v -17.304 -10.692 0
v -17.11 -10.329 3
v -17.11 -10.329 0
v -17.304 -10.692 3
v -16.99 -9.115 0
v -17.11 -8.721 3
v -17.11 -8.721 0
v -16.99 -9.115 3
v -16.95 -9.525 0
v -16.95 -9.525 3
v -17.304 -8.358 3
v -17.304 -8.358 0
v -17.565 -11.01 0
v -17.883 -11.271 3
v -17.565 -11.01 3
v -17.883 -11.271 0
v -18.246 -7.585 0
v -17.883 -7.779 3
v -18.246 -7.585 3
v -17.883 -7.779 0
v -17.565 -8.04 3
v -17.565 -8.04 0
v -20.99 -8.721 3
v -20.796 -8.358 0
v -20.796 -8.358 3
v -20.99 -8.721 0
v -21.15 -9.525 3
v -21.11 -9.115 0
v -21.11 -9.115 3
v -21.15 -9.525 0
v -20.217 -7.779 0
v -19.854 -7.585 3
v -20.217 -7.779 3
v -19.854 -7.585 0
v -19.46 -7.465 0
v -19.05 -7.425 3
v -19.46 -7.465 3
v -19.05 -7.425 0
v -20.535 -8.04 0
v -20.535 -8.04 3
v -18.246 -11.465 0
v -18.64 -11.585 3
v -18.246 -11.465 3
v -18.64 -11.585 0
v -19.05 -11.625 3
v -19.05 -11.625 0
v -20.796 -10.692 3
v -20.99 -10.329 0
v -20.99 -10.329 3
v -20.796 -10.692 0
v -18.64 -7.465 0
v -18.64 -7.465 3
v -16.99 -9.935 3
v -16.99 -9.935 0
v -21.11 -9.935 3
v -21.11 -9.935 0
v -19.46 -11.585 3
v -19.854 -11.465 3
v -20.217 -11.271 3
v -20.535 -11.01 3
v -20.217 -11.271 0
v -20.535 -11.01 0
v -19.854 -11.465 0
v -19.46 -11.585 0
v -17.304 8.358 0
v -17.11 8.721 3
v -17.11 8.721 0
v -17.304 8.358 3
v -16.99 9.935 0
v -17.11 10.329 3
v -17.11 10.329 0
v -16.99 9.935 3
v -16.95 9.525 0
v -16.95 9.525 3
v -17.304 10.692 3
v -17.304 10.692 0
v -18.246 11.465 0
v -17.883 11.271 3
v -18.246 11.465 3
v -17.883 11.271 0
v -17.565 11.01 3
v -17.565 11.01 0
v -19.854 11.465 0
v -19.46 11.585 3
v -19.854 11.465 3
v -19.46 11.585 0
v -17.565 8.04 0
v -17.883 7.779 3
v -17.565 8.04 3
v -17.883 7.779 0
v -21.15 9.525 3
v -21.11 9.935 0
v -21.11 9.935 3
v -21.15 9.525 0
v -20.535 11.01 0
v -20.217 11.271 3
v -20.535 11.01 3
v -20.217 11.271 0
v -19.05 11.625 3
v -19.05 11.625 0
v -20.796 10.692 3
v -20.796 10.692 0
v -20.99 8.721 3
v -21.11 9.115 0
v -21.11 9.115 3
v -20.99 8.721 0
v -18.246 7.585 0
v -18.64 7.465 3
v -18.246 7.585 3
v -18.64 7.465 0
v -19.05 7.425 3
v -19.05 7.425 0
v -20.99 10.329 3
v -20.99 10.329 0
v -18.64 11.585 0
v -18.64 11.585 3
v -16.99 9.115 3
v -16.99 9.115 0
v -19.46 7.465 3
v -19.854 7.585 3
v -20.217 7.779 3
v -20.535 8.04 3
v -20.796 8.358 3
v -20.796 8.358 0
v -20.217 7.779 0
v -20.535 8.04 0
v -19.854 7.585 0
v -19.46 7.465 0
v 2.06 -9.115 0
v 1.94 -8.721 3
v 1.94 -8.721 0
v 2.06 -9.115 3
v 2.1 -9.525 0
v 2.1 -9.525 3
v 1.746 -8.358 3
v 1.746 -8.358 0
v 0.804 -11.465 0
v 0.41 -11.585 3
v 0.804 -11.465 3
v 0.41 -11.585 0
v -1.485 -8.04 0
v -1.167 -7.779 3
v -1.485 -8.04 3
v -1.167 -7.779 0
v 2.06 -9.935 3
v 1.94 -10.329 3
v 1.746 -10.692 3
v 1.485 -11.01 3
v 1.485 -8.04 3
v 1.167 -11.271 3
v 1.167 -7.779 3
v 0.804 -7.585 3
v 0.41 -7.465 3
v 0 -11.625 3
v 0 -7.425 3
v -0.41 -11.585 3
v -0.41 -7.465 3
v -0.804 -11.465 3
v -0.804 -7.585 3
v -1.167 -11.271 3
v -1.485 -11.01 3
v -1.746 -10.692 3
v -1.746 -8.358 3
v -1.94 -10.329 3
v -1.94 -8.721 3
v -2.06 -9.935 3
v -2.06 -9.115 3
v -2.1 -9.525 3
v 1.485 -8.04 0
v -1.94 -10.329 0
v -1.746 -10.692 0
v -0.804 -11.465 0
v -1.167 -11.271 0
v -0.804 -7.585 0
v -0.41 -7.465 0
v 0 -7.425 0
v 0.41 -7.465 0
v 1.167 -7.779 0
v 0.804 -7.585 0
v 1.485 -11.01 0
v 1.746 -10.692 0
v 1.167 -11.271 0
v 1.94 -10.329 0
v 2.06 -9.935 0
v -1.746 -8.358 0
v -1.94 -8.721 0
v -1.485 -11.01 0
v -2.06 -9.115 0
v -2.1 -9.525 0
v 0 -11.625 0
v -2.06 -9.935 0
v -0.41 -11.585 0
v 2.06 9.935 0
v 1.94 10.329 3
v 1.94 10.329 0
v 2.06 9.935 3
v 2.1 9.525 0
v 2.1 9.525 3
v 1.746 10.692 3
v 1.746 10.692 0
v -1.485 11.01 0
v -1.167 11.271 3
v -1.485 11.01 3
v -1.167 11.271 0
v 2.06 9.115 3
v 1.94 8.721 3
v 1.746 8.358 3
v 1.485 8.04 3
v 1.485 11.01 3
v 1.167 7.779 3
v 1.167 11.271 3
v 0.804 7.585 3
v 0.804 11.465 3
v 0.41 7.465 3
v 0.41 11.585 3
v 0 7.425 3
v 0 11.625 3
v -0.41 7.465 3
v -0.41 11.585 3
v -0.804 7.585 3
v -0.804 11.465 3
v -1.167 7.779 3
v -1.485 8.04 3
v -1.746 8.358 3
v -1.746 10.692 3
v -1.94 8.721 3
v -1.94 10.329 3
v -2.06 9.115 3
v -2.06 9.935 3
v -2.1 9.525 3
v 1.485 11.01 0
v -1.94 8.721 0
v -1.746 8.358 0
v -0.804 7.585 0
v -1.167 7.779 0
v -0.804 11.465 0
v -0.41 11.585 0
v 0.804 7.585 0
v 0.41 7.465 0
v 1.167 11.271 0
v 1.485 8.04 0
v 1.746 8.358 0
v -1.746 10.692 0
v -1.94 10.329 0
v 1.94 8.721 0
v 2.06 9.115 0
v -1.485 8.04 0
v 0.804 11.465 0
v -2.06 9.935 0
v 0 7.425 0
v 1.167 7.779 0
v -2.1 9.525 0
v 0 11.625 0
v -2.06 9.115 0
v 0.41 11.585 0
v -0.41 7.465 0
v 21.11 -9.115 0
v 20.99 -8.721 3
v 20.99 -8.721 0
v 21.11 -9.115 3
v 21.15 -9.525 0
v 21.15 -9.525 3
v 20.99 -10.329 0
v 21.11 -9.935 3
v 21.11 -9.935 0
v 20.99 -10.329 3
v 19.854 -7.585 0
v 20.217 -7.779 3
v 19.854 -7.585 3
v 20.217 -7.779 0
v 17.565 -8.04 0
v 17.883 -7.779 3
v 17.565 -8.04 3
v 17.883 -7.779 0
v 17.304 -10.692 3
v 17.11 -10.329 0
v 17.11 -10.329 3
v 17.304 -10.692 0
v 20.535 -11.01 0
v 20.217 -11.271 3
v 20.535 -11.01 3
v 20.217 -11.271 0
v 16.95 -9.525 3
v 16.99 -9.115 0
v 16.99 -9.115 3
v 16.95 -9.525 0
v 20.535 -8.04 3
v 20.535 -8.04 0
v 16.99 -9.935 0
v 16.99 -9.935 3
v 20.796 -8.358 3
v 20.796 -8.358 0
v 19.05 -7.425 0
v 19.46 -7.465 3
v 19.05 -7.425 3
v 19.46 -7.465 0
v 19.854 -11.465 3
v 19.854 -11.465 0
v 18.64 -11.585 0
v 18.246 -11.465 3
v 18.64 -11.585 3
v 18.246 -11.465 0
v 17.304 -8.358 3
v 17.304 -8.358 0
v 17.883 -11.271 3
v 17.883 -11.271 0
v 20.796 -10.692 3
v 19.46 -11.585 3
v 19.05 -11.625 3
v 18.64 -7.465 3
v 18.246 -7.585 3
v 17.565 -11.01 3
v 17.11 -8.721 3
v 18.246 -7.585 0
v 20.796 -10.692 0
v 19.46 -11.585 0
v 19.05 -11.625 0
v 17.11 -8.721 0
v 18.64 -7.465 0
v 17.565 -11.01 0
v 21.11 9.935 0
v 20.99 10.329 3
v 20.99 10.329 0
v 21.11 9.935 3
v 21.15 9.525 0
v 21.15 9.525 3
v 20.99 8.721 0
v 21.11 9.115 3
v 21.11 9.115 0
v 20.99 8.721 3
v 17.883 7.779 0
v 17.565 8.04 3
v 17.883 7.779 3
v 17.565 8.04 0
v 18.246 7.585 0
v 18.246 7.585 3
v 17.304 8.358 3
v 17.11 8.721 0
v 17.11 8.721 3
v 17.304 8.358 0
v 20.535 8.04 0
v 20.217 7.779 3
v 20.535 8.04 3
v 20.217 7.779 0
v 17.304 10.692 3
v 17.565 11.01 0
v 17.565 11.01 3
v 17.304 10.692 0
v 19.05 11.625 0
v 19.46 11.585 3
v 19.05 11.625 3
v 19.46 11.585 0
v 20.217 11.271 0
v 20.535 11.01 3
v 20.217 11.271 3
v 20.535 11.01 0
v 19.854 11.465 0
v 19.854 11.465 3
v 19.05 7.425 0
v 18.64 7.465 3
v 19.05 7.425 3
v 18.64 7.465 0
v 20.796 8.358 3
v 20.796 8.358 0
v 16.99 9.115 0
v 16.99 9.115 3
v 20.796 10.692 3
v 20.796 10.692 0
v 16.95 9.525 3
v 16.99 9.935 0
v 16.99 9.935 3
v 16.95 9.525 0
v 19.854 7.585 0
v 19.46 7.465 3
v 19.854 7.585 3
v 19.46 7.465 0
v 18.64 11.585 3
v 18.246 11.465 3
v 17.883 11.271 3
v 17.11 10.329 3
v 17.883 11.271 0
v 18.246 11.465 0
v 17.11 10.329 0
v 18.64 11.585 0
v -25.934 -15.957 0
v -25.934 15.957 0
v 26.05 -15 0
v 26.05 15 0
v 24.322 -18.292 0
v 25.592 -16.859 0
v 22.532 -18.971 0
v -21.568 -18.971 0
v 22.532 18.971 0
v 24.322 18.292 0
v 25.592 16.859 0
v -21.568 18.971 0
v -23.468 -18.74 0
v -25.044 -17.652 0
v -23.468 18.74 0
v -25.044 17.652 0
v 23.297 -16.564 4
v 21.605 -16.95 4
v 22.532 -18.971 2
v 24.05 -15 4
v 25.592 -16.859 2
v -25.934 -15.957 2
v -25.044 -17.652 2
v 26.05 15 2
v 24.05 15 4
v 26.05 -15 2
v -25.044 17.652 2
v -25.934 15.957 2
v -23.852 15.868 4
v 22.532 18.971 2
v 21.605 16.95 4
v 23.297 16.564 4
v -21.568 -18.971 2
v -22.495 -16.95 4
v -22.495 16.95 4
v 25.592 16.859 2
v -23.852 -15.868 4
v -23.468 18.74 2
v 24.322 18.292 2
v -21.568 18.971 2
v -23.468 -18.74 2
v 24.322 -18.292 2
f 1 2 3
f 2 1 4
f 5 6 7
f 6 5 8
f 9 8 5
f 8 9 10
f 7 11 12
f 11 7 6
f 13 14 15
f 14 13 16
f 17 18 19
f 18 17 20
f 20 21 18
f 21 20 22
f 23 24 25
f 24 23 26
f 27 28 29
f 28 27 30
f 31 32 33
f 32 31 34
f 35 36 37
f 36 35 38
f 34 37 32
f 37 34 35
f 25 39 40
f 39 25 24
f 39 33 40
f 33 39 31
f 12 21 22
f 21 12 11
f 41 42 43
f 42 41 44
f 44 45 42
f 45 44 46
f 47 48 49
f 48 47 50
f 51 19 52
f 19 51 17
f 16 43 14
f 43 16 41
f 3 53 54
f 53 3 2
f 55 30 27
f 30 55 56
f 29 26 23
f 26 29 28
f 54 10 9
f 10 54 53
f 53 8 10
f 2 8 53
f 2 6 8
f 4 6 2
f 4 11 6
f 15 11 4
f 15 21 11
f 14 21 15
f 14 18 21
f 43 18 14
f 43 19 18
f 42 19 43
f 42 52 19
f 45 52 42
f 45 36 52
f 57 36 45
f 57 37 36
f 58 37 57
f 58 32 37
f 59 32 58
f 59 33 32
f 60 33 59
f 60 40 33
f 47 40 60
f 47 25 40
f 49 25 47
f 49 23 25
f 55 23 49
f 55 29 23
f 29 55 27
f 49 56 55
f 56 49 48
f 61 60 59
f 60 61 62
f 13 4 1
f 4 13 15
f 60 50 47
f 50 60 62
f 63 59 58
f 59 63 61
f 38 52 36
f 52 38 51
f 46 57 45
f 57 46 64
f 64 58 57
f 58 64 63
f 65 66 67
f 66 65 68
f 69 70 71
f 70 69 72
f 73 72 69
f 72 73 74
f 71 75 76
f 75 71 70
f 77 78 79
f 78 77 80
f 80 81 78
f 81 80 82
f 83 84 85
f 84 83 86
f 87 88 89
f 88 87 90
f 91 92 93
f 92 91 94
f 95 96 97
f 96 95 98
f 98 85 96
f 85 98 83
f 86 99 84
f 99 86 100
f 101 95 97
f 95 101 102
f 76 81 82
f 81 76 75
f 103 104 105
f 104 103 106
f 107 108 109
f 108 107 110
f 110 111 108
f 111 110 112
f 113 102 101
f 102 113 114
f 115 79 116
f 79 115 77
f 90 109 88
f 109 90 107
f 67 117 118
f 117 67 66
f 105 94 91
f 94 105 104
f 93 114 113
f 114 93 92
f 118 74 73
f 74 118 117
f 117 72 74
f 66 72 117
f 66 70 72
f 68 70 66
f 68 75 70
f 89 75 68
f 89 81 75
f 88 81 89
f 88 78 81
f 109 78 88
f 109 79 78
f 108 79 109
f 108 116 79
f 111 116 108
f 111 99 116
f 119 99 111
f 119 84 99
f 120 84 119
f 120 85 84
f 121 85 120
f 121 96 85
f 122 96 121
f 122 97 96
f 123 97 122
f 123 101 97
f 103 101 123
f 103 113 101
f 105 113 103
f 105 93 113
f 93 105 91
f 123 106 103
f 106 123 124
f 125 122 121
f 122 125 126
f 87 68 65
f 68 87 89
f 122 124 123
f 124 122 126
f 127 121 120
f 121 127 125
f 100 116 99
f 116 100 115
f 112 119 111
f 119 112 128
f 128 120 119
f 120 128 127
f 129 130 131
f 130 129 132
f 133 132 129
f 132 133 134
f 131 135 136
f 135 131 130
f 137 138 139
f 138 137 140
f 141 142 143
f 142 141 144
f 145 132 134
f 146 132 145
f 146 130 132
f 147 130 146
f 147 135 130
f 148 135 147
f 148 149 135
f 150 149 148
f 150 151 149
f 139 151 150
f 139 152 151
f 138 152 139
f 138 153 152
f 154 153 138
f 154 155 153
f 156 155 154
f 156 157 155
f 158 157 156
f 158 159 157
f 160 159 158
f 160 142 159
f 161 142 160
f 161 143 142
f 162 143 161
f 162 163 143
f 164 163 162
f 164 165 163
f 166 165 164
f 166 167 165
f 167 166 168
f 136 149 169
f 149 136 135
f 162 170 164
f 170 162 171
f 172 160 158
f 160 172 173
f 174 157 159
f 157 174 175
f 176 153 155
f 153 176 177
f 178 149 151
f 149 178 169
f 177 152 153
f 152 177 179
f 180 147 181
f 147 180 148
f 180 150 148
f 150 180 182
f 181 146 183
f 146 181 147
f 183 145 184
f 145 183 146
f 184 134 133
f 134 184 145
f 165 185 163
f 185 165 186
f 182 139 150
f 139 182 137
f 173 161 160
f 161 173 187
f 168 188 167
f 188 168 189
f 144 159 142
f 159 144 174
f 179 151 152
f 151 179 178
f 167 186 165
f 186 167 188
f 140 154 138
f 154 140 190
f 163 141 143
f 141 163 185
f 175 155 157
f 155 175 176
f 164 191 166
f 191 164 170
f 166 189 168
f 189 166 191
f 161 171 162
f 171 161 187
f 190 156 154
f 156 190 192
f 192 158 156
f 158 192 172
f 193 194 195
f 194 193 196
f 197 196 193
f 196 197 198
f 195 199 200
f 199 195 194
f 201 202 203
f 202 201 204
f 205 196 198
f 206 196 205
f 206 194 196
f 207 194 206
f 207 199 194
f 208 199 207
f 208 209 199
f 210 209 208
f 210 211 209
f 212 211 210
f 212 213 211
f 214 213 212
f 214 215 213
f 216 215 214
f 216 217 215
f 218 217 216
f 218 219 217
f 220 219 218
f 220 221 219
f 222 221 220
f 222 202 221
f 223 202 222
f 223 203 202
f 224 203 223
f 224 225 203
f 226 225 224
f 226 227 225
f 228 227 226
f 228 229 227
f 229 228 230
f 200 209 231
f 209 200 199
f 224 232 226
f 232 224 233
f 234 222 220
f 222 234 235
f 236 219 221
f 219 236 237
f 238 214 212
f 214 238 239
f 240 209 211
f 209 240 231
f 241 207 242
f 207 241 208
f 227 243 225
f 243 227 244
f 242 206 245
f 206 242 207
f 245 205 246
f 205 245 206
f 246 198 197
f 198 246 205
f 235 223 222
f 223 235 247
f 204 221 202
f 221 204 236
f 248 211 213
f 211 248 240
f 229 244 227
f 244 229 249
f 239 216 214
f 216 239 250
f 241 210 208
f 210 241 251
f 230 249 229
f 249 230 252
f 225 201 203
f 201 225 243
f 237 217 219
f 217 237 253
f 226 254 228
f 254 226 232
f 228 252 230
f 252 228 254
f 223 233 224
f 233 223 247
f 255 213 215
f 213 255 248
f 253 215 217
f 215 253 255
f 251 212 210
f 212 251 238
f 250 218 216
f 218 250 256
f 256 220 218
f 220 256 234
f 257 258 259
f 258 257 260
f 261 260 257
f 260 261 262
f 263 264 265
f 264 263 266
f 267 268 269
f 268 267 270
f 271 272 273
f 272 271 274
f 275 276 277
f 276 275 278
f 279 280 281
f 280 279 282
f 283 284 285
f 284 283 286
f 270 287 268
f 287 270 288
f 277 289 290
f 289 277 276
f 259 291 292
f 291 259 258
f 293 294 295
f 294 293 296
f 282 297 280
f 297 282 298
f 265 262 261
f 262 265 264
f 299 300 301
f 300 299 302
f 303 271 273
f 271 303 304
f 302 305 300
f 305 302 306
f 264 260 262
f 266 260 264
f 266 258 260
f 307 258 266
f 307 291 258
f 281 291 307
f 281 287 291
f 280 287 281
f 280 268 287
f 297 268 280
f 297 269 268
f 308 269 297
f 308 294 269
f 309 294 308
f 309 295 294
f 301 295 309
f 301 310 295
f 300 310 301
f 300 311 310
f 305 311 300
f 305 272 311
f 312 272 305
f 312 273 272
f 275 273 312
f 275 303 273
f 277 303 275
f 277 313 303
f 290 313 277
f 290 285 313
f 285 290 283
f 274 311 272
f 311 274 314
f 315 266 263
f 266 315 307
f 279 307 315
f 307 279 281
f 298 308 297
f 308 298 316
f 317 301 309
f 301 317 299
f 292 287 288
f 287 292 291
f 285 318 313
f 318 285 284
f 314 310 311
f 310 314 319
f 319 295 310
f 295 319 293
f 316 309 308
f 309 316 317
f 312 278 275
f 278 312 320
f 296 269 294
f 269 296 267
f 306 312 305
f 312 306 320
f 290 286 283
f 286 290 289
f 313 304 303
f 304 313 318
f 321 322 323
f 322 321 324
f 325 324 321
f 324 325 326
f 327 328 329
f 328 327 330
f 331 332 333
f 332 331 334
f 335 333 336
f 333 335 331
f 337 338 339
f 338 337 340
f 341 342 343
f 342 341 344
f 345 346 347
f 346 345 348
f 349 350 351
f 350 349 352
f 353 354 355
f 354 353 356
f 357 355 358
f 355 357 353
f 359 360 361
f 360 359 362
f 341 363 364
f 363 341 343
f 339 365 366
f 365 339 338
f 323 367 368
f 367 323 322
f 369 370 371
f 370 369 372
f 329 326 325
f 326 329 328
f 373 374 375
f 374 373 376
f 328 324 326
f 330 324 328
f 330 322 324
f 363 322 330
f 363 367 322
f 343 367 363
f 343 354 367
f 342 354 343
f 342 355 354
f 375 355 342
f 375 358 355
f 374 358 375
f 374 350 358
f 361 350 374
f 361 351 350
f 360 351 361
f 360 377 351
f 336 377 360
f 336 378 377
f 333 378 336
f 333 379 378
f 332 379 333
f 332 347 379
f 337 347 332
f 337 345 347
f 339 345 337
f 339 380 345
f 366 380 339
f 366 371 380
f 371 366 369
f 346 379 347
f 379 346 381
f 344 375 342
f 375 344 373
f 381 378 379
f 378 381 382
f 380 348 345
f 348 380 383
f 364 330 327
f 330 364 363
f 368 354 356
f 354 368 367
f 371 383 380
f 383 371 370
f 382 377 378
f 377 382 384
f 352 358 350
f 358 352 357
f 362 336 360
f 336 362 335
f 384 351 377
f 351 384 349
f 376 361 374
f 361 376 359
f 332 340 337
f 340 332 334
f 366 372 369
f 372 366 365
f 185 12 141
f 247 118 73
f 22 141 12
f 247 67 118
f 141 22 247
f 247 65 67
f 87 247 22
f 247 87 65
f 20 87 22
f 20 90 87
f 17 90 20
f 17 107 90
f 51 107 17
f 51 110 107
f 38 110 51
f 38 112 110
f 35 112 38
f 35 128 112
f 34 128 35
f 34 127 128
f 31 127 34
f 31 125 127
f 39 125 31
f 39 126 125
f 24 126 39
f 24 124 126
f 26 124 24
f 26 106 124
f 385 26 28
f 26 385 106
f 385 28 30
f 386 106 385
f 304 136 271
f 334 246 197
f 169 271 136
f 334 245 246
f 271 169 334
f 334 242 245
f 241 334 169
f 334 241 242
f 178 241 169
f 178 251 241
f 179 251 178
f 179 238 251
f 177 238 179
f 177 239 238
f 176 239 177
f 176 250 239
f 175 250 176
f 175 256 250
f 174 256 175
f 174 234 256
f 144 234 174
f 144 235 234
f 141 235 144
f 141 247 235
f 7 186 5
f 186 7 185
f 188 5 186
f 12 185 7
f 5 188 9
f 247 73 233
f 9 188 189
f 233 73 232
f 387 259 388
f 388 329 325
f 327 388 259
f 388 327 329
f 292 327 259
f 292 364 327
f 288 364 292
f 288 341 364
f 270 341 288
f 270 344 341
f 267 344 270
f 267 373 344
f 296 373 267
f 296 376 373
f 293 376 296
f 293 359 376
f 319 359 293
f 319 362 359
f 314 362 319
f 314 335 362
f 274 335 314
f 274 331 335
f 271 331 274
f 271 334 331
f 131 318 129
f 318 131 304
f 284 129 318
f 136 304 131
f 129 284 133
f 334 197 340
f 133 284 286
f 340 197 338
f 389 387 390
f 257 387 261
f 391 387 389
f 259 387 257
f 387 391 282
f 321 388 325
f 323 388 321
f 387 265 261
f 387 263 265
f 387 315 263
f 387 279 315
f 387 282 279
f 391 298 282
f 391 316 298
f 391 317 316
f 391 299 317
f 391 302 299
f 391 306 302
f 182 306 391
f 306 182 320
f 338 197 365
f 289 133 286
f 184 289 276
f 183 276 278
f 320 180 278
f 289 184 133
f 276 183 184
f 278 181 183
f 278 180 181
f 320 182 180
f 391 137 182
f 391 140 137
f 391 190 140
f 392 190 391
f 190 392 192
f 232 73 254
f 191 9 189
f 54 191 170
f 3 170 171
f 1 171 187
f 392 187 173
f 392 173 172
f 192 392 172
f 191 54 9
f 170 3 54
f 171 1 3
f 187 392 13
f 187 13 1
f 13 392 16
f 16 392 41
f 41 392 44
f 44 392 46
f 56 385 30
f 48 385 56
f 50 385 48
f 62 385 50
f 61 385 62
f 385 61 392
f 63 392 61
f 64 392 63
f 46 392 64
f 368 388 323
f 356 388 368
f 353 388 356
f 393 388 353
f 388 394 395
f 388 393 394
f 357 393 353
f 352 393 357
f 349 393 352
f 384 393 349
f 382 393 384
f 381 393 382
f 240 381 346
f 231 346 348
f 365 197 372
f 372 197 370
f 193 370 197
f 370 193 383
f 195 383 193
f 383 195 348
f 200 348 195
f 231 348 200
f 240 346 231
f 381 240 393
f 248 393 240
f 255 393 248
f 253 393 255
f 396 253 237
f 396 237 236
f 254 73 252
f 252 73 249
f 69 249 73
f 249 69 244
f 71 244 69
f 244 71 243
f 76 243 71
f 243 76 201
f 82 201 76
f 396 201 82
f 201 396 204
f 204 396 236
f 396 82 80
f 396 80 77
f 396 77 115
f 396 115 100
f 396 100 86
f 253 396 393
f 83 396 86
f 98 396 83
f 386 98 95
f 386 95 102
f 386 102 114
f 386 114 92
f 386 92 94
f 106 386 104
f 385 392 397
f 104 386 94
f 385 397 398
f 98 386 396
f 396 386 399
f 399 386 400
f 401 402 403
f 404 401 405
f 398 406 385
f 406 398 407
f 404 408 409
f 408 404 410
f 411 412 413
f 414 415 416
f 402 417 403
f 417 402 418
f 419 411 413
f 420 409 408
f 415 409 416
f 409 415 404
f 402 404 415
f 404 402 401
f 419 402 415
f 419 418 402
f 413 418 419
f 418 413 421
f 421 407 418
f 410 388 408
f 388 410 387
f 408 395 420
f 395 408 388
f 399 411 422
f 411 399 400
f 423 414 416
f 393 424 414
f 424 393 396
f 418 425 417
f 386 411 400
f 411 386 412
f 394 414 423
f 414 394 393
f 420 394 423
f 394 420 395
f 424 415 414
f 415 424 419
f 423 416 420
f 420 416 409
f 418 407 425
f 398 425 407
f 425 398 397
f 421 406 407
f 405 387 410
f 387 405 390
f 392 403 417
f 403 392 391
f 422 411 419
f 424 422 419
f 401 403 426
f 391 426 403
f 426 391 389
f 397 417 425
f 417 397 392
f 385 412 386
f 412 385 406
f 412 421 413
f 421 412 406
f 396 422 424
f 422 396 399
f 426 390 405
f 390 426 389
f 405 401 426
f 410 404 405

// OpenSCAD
// file: ../lib/common.scad
// Copyright (c) 2026 mmmaxwwwell
// Licensed under CC BY-NC-ND 4.0, https://creativecommons.org/licenses/by-nc-nd/4.0/
// Free for personal use. Commercial use requires a separate license.
//
// Kanix Common Parameters
// Shared constants Kanix belt clip mounting.
// 3x3 grid of holes, 3/4" (19.05mm) spacing, M5 self-tapping screws.

// ===== Kanix Mounting Constants =====
kanix_hole_spacing = 19.05; // mm between adjacent holes (3/4")
kanix_screw_d      = 4.2;   // mm pilot hole for M5 self-tap

// ===== Default Plate Parameters =====
// Override these after include if your design needs different values.
plate_margin   = 7;   // mm margin around outermost holes
plate_corner_r = 4;   // mm corner radius
plate_edge_r   = 2;   // mm top edge rounding radius

// ===== Helper Functions =====

// Plate dimension for a given grid size and margin.
// Returns the width or height of a square plate that fits the hole grid.
function kanix_plate_dim(grid_size, margin = plate_margin) =
    kanix_hole_spacing * (grid_size - 1) + margin * 2;

// Grid offset: centers a grid_size x grid_size pattern around the origin.
function kanix_grid_offset(grid_size) =
    (grid_size - 1) / 2;
// file: ../lib/mounting-plate.scad
// Copyright (c) 2026 mmmaxwwwell
// Licensed under CC BY-NC-ND 4.0, https://creativecommons.org/licenses/by-nc-nd/4.0/
// Free for personal use. Commercial use requires a separate license.
//
// Kanix Mounting Plate
//
// The flat back plate that accessories use to bolt onto a Kanix belt clip.
// Geometry: rounded rectangle with a rounded top edge, drilled from the
// bottom face with a blind bolt-shaft clearance grid that does NOT break
// through the top face. No counterbore — just the shaft.
//
// Bottom face (Z=0) is the clip-side: bolts come up from the clip into the
// plate. Top face stays unbroken — better cosmetics and prints flat without
// bridging over hole tops.
//
// Usage:
//   include <lib/presets.scad>
//   use <lib/mounting-plate.scad>
//   mounting_plate(kanix_grid_3x2);

include <common.scad>
include <presets.scad>

// Default plate thickness for accessory back-plates. Accessories don't carry
// a belt preset, so they can't read plate_thickness from one. Override per
// accessory if you need more bolt-bite depth.
mounting_plate_default_thickness = 4;
mounting_plate_default_screw_depth = 3;

// Render a back plate sized + drilled for the given grid preset.
//
// grid              — a kanix_grid_* bundle from lib/presets.scad
// thickness         — plate thickness in mm (default: 4)
// corner_r          — XY corner radius (default: common.scad's plate_corner_r)
// edge_r            — top-edge fillet radius (default: common.scad's plate_edge_r)
// screw_hole_depth  — blind drill depth measured from the bottom face up
//                     (default: 3mm). Must be < thickness.
// drill_holes       — set false to omit the bolt grid
// hole_cols/rows    — override the grid's cols/rows to render a partial plate
//                     (e.g. a 1-row strip cut from a 3x3 grid). When set,
//                     plate width/height scale proportionally.
// cutout            — when true, output ONLY the bolt-hole cylinders (no
//                     body). Use this inside a parent difference() when the
//                     plate body has been replaced or reshaped (e.g. after
//                     a hull) and you still want the original bolt pattern
//                     punched through.
module mounting_plate(
    grid,
    thickness         = undef,
    corner_r          = undef,
    edge_r            = undef,
    screw_hole_depth  = undef,
    drill_holes       = true,
    hole_cols         = undef,
    hole_rows         = undef,
    cutout            = false
) {
    t          = thickness == undef ? mounting_plate_default_thickness : thickness;
    cr         = corner_r  == undef ? plate_corner_r : corner_r;
    er         = edge_r    == undef ? plate_edge_r   : edge_r;
    hole_dep   = screw_hole_depth == undef ? mounting_plate_default_screw_depth : screw_hole_depth;

    // Partial-plate slicing: caller can render a subset of the grid by passing
    // hole_cols/hole_rows < the grid's own counts. Plate w/h scale linearly
    // off the grid's full footprint so the "slice" footprint matches.
    full_cols  = preset_get(grid, "hole_cols");
    full_rows  = preset_get(grid, "hole_rows");
    cols       = hole_cols == undef ? full_cols : hole_cols;
    rows       = hole_rows == undef ? full_rows : hole_rows;
    full_w     = preset_get(grid, "plate_w");
    full_h     = preset_get(grid, "plate_h");
    w          = full_w * cols / full_cols;
    h          = full_h * rows / full_rows;

    assert(hole_dep < t,
        "screw_hole_depth must be < plate thickness (holes are blind)");

    if (cutout) {
        plate_holes(grid, t + 0.2, cols, rows);
    } else {
        difference() {
            plate_body(w, h, t, cr, er);
            if (drill_holes) plate_holes(grid, hole_dep, cols, rows);
        }
    }
}

// Plate body: rounded rectangle with a rounded top edge. Bottom face is flat
// (sits on the build plate); top face is filleted by edge_r.
module plate_body(w, h, t, cr, er) {
    hull() {
        for (x = [-w/2 + cr, w/2 - cr])
            for (y = [-h/2 + cr, h/2 - cr])
                translate([x, y, 0])
                    cylinder(r = cr, h = t - er);
        for (x = [-w/2 + cr, w/2 - cr])
            for (y = [-h/2 + cr, h/2 - cr])
                translate([x, y, t - er]) {
                    cylinder(r = cr - er, h = er);
                    sphere(r = er);
                }
    }
}

// Bolt grid: blind shaft-clearance hole drilled from the bottom face up to
// `hole_dep`. No counterbore — just the shaft. Pattern centered on origin.
module plate_holes(grid, hole_dep, cols, rows) {
    spacing    = preset_get(grid, "hole_spacing");
    pilot_d    = preset_get(grid, "pilot_hole_d");
    col_offset = (cols - 1) / 2;
    row_offset = (rows - 1) / 2;

    for (col = [0 : cols - 1])
        for (row = [0 : rows - 1])
            translate([
                (col - col_offset) * spacing,
                (row - row_offset) * spacing,
                -0.1
            ])
                cylinder(d = pilot_d, h = hole_dep + 0.1, $fn = 32);
}
// file: ../lib/presets.scad
// Copyright (c) 2026 mmmaxwwwell
// Licensed under CC BY-NC-ND 4.0, https://creativecommons.org/licenses/by-nc-nd/4.0/
// Free for personal use. Commercial use requires a separate license.
//
// Kanix Presets — grids and belts
//
// Two preset families:
//
//   kanix_grid_<cols>x<rows>   — bolt pattern + plate footprint. Everything an
//                                accessory needs to bolt onto a Kanix plate.
//                                Rows imply belt height: 2 rows = 38mm/1.5"
//                                belt, 3 rows = 52mm/2" belt.
//
//   kanix_belt_<h>x<t>         — belt-only fields (height, thickness, plate
//                                thickness, screw length). Consumed by the
//                                kanix_plate clip module. Accessories ignore.
//
// A render fixture for the clip combines the two:
//   kanix_plate(kanix_grid_3x2, kanix_belt_38x4);
//
// A render fixture for an accessory only needs the grid:
//   clicker_holder(kanix_grid_3x2);
//
// Look up fields with preset_get(p, "key"). Misspell a key → undef → loud
// failure on first numeric op. Do not paper over with default fallbacks.

include <common.scad>

// ============================================================================
// GRID PRESETS — bolt pattern + plate footprint (what accessories see)
// ============================================================================
//
// Field reference:
//   name          short id for fixtures
//   hole_cols     bolt columns (across the belt)
//   hole_rows     bolt rows   (up the belt) — 2 = 38mm belt, 3 = 52mm belt
//   hole_spacing  mm between adjacent holes (always kanix_hole_spacing)
//   plate_w       plate width  in mm (across the belt)
//   plate_h       plate height in mm (up the belt)   — matches belt height
//   pilot_hole_d  M5 self-tap pilot
//
// Plate footprint rule of thumb: plate_h matches the belt height (38 or 52).
// plate_w = hole_spacing*(cols-1) + 2*margin, where margin is chosen per grid
// to give a clean edge-to-hole distance.

// ----- 38mm belt (1.5" duty), 2 rows -----
kanix_grid_2x2 = [
    ["name",          "2x2"],
    ["hole_cols",      2],
    ["hole_rows",      2],
    ["hole_spacing",   kanix_hole_spacing],
    ["plate_w",        38],
    ["plate_h",        38],
    ["pilot_hole_d",   kanix_screw_d]
];

kanix_grid_3x2 = [
    ["name",          "3x2"],
    ["hole_cols",      3],
    ["hole_rows",      2],
    ["hole_spacing",   kanix_hole_spacing],
    ["plate_w",        kanix_hole_spacing * 2 + 14],   // 57.1
    ["plate_h",        38],
    ["pilot_hole_d",   kanix_screw_d]
];

kanix_grid_4x2 = [
    ["name",          "4x2"],
    ["hole_cols",      4],
    ["hole_rows",      2],
    ["hole_spacing",   kanix_hole_spacing],
    ["plate_w",        kanix_hole_spacing * 3 + 14],   // 76.15
    ["plate_h",        38],
    ["pilot_hole_d",   kanix_screw_d]
];

// ----- 52mm belt (2" duty), 3 rows -----
kanix_grid_3x3 = [
    ["name",          "3x3"],
    ["hole_cols",      3],
    ["hole_rows",      3],
    ["hole_spacing",   kanix_hole_spacing],
    ["plate_w",        52],
    ["plate_h",        52],
    ["pilot_hole_d",   kanix_screw_d]
];

kanix_grid_4x3 = [
    ["name",          "4x3"],
    ["hole_cols",      4],
    ["hole_rows",      3],
    ["hole_spacing",   kanix_hole_spacing],
    ["plate_w",        kanix_hole_spacing * 3 + 14],   // 76.15
    ["plate_h",        52],
    ["pilot_hole_d",   kanix_screw_d]
];

// ============================================================================
// BELT PRESETS — clip-only (height, thickness, plate thickness, screw length)
// ============================================================================
//
// Field reference:
//   name             short id for fixtures
//   belt_height      mm; informational — matches the grid's plate_h
//   belt_thickness   mm; gap the clip wraps around the belt
//   plate_thickness  mm; thickness of the back plate (where bolts go)
//   screw_length     mm; max bite depth into plate (plate_thickness - 1mm)

// ----- 38mm / 1.5" duty belts -----
kanix_belt_38x4 = [
    ["name",            "38x4"],
    ["belt_height",     38],
    ["belt_thickness",  4],
    ["plate_thickness", 4],
    ["screw_length",    3]
];

kanix_belt_38x5_3 = [
    ["name",            "38x5.3"],
    ["belt_height",     38],
    ["belt_thickness",  5.3],
    ["plate_thickness", 4],
    ["screw_length",    3]
];

// ----- 52mm / 2" duty belts -----
kanix_belt_52x6_5 = [
    ["name",            "52x6.5"],
    ["belt_height",     52],
    ["belt_thickness",  6.5],
    ["plate_thickness", 5.5],
    ["screw_length",    5]
];

kanix_belt_52x12 = [
    ["name",            "52x12"],
    ["belt_height",     52],
    ["belt_thickness",  12],
    ["plate_thickness", 5.5],
    ["screw_length",    5]
];

// ============================================================================
// Legacy combined presets — DEPRECATED, do not use in new code
// ============================================================================
// These flatten a grid + belt into one bundle so existing accessory files
// (clicker_holder_*.scad, wuben-c3-holster.scad, etc.) keep rendering until
// they're migrated to take just a grid preset. New accessories should take
// kanix_grid_* directly; new plates use kanix_grid_* + kanix_belt_*.

kanix_preset_38x4 = [
    ["name",            "38x4"],
    ["plate_size",      38],
    ["plate_thickness", 4],
    ["belt_thickness",  4],
    ["belt_height",     51],
    ["hole_cols",       2],
    ["hole_rows",       2],
    ["hole_spacing",    kanix_hole_spacing],
    ["plate_w",         38],
    ["plate_h",         38],
    ["pilot_hole_d",    kanix_screw_d],
    ["screw_length",    3]
];

kanix_preset_52x65 = [
    ["name",            "52x6_5"],
    ["plate_size",      52],
    ["plate_thickness", 5.5],
    ["belt_thickness",  6.5],
    ["belt_height",     51],
    ["hole_cols",       3],
    ["hole_rows",       3],
    ["hole_spacing",    kanix_hole_spacing],
    ["plate_w",         52],
    ["plate_h",         52],
    ["pilot_hole_d",    kanix_screw_d],
    ["screw_length",    5]
];

// ============================================================================
// Accessor
// ============================================================================
// Look up a field by key. Errors loudly (undef) if the key is absent so a
// typo surfaces immediately instead of silently using a default.
function preset_get(preset, key) =
    let (hits = [for (kv = preset) if (kv[0] == key) kv[1]])
    hits[0];
// main file
// Copyright (c) 2026 mmmaxwwwell
// Licensed under CC BY-NC-ND 4.0, https://creativecommons.org/licenses/by-nc-nd/4.0/
// Free for personal use. Commercial use requires a separate license.
//
// Render fixture: Kanix clip — 3x2 grid, 38mm belt height, 4mm belt thickness.
//
// TODO: kanix-plate.scad currently only supports square plates. This fixture
// renders a placeholder mounting_plate (back plate only) until kanix-plate
// is reworked to handle rectangular grids. Switch to kanix_plate_from_presets
// once the rewrite lands.

include <../lib/presets.scad>
use <../lib/mounting-plate.scad>

mounting_plate(kanix_grid_3x2, thickness = 4);
